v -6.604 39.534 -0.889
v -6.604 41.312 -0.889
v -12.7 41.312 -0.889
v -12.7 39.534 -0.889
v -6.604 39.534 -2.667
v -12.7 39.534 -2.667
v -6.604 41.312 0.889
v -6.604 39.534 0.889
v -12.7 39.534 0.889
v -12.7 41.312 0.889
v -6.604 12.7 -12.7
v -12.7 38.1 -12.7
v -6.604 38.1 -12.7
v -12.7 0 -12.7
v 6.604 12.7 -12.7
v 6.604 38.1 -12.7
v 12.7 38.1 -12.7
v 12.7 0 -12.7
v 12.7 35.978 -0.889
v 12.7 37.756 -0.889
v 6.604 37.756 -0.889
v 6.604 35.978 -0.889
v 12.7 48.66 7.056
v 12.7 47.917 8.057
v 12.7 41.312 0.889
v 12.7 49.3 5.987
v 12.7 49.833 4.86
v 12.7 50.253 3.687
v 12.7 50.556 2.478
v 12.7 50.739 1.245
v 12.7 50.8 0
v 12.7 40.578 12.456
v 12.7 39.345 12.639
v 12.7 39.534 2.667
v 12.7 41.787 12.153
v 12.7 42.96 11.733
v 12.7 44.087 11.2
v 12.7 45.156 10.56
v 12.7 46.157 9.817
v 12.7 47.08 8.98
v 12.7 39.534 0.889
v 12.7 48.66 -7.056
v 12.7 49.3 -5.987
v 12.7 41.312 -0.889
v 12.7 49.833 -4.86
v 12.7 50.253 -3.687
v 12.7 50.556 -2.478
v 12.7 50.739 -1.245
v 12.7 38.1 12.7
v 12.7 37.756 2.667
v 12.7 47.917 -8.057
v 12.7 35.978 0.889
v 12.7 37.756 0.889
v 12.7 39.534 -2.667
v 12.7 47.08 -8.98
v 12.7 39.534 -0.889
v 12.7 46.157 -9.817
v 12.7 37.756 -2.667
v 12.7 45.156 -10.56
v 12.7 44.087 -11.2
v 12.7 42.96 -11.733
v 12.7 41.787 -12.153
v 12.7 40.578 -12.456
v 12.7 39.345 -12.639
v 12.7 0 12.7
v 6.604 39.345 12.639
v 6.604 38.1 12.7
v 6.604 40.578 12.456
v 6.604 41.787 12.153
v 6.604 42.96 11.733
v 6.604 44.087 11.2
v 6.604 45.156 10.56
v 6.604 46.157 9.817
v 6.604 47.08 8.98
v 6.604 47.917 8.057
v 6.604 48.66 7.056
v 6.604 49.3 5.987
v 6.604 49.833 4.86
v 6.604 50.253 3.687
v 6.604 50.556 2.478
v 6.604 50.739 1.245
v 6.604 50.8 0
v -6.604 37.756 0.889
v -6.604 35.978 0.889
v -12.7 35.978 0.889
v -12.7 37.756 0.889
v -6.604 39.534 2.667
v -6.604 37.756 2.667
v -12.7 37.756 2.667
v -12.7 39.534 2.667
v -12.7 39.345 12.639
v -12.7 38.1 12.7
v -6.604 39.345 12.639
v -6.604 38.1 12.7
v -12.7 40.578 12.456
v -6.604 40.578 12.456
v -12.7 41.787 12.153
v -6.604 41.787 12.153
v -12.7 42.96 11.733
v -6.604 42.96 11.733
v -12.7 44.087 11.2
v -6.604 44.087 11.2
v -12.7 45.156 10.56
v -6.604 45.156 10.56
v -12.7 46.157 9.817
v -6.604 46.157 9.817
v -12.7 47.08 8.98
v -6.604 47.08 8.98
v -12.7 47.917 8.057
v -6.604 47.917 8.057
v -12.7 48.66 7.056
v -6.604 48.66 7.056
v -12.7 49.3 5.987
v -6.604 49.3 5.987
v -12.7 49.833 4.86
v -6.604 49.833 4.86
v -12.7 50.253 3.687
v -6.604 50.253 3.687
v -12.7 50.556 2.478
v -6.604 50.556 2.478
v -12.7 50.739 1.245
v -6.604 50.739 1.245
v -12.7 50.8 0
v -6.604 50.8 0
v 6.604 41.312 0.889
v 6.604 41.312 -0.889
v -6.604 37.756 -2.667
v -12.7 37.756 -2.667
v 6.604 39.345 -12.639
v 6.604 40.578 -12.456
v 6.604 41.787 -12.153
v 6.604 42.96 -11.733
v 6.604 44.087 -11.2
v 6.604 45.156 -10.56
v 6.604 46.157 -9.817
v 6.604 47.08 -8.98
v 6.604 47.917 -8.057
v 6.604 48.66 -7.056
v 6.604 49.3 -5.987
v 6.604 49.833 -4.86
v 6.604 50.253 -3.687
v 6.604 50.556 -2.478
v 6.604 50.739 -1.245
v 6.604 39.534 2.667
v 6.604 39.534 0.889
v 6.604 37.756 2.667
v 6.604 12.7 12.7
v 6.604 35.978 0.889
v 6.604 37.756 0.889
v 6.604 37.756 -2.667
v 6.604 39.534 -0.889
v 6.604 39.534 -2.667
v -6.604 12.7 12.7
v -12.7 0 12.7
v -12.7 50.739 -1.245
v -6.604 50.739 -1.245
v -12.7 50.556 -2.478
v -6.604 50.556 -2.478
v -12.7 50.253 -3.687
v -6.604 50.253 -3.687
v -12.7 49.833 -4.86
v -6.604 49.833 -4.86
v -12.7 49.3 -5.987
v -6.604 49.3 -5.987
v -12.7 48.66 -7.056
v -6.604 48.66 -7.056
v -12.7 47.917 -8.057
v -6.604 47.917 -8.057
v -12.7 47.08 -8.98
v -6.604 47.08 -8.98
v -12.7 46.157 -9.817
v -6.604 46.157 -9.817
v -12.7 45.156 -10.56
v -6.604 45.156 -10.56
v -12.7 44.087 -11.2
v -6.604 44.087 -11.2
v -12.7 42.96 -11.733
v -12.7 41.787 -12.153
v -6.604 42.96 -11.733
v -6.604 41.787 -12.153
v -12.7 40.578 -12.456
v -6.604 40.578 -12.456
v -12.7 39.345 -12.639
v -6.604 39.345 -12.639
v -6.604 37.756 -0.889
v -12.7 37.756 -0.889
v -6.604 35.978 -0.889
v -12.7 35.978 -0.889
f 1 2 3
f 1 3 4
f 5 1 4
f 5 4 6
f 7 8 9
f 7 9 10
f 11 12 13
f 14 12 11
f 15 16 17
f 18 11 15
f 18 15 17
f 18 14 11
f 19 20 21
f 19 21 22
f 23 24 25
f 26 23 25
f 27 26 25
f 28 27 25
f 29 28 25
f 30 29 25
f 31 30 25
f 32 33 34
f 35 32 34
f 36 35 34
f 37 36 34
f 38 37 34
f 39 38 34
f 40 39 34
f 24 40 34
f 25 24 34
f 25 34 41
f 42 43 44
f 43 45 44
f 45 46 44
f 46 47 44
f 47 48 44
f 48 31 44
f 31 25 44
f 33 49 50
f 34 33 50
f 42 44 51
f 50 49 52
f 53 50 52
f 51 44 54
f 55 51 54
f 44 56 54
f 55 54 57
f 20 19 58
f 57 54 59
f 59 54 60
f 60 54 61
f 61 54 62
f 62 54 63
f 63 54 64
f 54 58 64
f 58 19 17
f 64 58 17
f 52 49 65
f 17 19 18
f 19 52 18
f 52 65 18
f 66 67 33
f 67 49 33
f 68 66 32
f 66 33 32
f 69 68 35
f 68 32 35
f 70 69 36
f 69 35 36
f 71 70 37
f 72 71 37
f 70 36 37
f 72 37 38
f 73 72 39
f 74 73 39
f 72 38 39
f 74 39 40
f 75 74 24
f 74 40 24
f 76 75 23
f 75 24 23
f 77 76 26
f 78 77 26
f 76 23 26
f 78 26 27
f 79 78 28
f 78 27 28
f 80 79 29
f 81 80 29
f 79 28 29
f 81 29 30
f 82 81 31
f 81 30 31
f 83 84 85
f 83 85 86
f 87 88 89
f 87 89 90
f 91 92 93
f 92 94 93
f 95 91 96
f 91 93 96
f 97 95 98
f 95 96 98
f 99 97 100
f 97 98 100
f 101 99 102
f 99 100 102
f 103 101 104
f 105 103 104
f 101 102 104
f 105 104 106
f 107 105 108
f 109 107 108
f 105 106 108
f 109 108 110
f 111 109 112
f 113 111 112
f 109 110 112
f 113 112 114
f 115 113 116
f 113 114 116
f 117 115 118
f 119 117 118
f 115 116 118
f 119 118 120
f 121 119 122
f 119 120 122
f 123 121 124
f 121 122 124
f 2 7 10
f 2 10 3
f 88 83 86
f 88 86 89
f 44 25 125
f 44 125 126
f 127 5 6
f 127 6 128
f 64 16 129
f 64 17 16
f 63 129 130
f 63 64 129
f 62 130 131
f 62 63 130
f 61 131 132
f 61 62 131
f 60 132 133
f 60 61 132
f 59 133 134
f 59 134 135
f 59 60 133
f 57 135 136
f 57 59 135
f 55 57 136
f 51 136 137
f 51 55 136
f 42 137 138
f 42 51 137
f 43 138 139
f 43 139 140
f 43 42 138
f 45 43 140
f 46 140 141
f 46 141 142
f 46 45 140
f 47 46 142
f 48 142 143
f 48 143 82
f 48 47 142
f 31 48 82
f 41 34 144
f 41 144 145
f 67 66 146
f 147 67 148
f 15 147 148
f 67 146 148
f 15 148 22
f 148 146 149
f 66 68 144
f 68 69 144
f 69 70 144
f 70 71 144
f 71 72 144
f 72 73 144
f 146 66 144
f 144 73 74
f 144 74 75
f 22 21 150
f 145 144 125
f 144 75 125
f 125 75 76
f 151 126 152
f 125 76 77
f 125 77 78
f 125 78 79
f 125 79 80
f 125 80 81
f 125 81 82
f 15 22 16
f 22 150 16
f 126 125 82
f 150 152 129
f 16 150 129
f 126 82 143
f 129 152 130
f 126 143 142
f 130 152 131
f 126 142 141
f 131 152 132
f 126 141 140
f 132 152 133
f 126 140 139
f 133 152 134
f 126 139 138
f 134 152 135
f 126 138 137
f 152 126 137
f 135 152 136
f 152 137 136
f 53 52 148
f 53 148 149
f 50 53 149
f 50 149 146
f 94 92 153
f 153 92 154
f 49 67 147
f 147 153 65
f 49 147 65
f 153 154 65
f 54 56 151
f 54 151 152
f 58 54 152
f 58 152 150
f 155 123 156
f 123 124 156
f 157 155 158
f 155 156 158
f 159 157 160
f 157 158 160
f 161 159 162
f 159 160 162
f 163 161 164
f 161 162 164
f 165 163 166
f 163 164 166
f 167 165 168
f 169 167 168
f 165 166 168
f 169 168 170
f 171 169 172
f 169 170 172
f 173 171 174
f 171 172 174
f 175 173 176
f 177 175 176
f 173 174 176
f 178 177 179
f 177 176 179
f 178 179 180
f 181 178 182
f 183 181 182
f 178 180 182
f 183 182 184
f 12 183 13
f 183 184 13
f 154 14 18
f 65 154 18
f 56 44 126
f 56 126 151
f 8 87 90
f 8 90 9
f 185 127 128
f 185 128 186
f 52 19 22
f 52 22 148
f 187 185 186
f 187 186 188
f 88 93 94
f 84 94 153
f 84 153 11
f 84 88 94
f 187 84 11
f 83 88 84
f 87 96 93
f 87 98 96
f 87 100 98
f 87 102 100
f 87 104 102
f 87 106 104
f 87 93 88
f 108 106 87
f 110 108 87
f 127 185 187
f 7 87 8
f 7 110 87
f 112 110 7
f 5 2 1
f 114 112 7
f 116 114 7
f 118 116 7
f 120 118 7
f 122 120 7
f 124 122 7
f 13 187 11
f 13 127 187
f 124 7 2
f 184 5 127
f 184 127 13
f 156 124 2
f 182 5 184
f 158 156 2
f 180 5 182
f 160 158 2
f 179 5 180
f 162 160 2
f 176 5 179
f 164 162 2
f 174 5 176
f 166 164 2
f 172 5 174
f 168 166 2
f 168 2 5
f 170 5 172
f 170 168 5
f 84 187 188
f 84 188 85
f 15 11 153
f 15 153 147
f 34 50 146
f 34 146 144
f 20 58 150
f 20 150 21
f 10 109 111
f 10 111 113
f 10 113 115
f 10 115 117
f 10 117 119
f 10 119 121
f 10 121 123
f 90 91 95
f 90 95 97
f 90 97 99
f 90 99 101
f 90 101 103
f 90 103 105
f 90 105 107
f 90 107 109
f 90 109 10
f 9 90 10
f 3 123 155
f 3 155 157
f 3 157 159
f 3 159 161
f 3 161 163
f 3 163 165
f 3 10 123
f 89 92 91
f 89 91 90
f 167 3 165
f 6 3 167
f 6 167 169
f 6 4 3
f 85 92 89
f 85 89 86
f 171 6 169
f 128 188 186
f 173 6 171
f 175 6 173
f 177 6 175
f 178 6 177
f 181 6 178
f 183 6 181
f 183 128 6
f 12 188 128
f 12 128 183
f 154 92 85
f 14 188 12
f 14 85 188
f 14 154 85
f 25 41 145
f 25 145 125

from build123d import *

# Parameters (mm, degrees)
SKETCH1_W           = 25.4
SKETCH1_H           = 25.4
BOSS_EXTRUDE1_DEPTH = 50.8
SKETCH2_W           = 13.208
SKETCH2_H           = 25.4
CUT_EXTRUDE1_DEPTH  = 38.1
CUT_EXTRUDE2_DEPTH  = 59.198711326
FILLET1_R           = 12.7


with BuildPart() as part:
    # Sketch1 → Boss-Extrude1 (new body)
    with BuildSketch(Plane(origin=(0, 0, 0), x_dir=(1, 0, 0), z_dir=(0, 1, 0))):
        Rectangle(SKETCH1_W, SKETCH1_H)
    extrude(amount=BOSS_EXTRUDE1_DEPTH)

    # Sketch2 → Cut-Extrude1 (cut)
    with BuildSketch(Plane(origin=(0, 50.8, 0), x_dir=(1, 0, 0), z_dir=(0, 1, 0))):
        Rectangle(SKETCH2_W, SKETCH2_H)
    extrude(amount=-CUT_EXTRUDE1_DEPTH, mode=Mode.SUBTRACT)

    # Sketch3 → Cut-Extrude2 (cut, through all)
    with BuildSketch(Plane(origin=(12.7, 0, 0), x_dir=(0, 0, -1), z_dir=(1, 0, 0))):
        Polygon((-0.889, 41.312023576), (0.889, 41.312023576), (0.889, 39.534023576), (2.667, 39.534023576), (2.667, 37.756023576), (0.889, 37.756023576), (0.889, 35.978023576), (-0.889, 35.978023576), (-0.889, 37.756023576), (-2.667, 37.756023576), (-2.667, 39.534023576), (-0.889, 39.534023576), align=None)
    extrude(amount=-CUT_EXTRUDE2_DEPTH, mode=Mode.SUBTRACT)

    # Fillet1
    fillet1_edges = [part.edges().sort_by_distance(p)[0] for p in [
        (9.652, 50.8, -12.7),
        (-9.652, 50.8, -12.7),
        (-9.652, 50.8, 12.7),
        (9.652, 50.8, 12.7),
    ]]
    fillet(fillet1_edges, radius=FILLET1_R - 0.0001)  # a hair under: the kernel refuses the full size


solid = part.part
